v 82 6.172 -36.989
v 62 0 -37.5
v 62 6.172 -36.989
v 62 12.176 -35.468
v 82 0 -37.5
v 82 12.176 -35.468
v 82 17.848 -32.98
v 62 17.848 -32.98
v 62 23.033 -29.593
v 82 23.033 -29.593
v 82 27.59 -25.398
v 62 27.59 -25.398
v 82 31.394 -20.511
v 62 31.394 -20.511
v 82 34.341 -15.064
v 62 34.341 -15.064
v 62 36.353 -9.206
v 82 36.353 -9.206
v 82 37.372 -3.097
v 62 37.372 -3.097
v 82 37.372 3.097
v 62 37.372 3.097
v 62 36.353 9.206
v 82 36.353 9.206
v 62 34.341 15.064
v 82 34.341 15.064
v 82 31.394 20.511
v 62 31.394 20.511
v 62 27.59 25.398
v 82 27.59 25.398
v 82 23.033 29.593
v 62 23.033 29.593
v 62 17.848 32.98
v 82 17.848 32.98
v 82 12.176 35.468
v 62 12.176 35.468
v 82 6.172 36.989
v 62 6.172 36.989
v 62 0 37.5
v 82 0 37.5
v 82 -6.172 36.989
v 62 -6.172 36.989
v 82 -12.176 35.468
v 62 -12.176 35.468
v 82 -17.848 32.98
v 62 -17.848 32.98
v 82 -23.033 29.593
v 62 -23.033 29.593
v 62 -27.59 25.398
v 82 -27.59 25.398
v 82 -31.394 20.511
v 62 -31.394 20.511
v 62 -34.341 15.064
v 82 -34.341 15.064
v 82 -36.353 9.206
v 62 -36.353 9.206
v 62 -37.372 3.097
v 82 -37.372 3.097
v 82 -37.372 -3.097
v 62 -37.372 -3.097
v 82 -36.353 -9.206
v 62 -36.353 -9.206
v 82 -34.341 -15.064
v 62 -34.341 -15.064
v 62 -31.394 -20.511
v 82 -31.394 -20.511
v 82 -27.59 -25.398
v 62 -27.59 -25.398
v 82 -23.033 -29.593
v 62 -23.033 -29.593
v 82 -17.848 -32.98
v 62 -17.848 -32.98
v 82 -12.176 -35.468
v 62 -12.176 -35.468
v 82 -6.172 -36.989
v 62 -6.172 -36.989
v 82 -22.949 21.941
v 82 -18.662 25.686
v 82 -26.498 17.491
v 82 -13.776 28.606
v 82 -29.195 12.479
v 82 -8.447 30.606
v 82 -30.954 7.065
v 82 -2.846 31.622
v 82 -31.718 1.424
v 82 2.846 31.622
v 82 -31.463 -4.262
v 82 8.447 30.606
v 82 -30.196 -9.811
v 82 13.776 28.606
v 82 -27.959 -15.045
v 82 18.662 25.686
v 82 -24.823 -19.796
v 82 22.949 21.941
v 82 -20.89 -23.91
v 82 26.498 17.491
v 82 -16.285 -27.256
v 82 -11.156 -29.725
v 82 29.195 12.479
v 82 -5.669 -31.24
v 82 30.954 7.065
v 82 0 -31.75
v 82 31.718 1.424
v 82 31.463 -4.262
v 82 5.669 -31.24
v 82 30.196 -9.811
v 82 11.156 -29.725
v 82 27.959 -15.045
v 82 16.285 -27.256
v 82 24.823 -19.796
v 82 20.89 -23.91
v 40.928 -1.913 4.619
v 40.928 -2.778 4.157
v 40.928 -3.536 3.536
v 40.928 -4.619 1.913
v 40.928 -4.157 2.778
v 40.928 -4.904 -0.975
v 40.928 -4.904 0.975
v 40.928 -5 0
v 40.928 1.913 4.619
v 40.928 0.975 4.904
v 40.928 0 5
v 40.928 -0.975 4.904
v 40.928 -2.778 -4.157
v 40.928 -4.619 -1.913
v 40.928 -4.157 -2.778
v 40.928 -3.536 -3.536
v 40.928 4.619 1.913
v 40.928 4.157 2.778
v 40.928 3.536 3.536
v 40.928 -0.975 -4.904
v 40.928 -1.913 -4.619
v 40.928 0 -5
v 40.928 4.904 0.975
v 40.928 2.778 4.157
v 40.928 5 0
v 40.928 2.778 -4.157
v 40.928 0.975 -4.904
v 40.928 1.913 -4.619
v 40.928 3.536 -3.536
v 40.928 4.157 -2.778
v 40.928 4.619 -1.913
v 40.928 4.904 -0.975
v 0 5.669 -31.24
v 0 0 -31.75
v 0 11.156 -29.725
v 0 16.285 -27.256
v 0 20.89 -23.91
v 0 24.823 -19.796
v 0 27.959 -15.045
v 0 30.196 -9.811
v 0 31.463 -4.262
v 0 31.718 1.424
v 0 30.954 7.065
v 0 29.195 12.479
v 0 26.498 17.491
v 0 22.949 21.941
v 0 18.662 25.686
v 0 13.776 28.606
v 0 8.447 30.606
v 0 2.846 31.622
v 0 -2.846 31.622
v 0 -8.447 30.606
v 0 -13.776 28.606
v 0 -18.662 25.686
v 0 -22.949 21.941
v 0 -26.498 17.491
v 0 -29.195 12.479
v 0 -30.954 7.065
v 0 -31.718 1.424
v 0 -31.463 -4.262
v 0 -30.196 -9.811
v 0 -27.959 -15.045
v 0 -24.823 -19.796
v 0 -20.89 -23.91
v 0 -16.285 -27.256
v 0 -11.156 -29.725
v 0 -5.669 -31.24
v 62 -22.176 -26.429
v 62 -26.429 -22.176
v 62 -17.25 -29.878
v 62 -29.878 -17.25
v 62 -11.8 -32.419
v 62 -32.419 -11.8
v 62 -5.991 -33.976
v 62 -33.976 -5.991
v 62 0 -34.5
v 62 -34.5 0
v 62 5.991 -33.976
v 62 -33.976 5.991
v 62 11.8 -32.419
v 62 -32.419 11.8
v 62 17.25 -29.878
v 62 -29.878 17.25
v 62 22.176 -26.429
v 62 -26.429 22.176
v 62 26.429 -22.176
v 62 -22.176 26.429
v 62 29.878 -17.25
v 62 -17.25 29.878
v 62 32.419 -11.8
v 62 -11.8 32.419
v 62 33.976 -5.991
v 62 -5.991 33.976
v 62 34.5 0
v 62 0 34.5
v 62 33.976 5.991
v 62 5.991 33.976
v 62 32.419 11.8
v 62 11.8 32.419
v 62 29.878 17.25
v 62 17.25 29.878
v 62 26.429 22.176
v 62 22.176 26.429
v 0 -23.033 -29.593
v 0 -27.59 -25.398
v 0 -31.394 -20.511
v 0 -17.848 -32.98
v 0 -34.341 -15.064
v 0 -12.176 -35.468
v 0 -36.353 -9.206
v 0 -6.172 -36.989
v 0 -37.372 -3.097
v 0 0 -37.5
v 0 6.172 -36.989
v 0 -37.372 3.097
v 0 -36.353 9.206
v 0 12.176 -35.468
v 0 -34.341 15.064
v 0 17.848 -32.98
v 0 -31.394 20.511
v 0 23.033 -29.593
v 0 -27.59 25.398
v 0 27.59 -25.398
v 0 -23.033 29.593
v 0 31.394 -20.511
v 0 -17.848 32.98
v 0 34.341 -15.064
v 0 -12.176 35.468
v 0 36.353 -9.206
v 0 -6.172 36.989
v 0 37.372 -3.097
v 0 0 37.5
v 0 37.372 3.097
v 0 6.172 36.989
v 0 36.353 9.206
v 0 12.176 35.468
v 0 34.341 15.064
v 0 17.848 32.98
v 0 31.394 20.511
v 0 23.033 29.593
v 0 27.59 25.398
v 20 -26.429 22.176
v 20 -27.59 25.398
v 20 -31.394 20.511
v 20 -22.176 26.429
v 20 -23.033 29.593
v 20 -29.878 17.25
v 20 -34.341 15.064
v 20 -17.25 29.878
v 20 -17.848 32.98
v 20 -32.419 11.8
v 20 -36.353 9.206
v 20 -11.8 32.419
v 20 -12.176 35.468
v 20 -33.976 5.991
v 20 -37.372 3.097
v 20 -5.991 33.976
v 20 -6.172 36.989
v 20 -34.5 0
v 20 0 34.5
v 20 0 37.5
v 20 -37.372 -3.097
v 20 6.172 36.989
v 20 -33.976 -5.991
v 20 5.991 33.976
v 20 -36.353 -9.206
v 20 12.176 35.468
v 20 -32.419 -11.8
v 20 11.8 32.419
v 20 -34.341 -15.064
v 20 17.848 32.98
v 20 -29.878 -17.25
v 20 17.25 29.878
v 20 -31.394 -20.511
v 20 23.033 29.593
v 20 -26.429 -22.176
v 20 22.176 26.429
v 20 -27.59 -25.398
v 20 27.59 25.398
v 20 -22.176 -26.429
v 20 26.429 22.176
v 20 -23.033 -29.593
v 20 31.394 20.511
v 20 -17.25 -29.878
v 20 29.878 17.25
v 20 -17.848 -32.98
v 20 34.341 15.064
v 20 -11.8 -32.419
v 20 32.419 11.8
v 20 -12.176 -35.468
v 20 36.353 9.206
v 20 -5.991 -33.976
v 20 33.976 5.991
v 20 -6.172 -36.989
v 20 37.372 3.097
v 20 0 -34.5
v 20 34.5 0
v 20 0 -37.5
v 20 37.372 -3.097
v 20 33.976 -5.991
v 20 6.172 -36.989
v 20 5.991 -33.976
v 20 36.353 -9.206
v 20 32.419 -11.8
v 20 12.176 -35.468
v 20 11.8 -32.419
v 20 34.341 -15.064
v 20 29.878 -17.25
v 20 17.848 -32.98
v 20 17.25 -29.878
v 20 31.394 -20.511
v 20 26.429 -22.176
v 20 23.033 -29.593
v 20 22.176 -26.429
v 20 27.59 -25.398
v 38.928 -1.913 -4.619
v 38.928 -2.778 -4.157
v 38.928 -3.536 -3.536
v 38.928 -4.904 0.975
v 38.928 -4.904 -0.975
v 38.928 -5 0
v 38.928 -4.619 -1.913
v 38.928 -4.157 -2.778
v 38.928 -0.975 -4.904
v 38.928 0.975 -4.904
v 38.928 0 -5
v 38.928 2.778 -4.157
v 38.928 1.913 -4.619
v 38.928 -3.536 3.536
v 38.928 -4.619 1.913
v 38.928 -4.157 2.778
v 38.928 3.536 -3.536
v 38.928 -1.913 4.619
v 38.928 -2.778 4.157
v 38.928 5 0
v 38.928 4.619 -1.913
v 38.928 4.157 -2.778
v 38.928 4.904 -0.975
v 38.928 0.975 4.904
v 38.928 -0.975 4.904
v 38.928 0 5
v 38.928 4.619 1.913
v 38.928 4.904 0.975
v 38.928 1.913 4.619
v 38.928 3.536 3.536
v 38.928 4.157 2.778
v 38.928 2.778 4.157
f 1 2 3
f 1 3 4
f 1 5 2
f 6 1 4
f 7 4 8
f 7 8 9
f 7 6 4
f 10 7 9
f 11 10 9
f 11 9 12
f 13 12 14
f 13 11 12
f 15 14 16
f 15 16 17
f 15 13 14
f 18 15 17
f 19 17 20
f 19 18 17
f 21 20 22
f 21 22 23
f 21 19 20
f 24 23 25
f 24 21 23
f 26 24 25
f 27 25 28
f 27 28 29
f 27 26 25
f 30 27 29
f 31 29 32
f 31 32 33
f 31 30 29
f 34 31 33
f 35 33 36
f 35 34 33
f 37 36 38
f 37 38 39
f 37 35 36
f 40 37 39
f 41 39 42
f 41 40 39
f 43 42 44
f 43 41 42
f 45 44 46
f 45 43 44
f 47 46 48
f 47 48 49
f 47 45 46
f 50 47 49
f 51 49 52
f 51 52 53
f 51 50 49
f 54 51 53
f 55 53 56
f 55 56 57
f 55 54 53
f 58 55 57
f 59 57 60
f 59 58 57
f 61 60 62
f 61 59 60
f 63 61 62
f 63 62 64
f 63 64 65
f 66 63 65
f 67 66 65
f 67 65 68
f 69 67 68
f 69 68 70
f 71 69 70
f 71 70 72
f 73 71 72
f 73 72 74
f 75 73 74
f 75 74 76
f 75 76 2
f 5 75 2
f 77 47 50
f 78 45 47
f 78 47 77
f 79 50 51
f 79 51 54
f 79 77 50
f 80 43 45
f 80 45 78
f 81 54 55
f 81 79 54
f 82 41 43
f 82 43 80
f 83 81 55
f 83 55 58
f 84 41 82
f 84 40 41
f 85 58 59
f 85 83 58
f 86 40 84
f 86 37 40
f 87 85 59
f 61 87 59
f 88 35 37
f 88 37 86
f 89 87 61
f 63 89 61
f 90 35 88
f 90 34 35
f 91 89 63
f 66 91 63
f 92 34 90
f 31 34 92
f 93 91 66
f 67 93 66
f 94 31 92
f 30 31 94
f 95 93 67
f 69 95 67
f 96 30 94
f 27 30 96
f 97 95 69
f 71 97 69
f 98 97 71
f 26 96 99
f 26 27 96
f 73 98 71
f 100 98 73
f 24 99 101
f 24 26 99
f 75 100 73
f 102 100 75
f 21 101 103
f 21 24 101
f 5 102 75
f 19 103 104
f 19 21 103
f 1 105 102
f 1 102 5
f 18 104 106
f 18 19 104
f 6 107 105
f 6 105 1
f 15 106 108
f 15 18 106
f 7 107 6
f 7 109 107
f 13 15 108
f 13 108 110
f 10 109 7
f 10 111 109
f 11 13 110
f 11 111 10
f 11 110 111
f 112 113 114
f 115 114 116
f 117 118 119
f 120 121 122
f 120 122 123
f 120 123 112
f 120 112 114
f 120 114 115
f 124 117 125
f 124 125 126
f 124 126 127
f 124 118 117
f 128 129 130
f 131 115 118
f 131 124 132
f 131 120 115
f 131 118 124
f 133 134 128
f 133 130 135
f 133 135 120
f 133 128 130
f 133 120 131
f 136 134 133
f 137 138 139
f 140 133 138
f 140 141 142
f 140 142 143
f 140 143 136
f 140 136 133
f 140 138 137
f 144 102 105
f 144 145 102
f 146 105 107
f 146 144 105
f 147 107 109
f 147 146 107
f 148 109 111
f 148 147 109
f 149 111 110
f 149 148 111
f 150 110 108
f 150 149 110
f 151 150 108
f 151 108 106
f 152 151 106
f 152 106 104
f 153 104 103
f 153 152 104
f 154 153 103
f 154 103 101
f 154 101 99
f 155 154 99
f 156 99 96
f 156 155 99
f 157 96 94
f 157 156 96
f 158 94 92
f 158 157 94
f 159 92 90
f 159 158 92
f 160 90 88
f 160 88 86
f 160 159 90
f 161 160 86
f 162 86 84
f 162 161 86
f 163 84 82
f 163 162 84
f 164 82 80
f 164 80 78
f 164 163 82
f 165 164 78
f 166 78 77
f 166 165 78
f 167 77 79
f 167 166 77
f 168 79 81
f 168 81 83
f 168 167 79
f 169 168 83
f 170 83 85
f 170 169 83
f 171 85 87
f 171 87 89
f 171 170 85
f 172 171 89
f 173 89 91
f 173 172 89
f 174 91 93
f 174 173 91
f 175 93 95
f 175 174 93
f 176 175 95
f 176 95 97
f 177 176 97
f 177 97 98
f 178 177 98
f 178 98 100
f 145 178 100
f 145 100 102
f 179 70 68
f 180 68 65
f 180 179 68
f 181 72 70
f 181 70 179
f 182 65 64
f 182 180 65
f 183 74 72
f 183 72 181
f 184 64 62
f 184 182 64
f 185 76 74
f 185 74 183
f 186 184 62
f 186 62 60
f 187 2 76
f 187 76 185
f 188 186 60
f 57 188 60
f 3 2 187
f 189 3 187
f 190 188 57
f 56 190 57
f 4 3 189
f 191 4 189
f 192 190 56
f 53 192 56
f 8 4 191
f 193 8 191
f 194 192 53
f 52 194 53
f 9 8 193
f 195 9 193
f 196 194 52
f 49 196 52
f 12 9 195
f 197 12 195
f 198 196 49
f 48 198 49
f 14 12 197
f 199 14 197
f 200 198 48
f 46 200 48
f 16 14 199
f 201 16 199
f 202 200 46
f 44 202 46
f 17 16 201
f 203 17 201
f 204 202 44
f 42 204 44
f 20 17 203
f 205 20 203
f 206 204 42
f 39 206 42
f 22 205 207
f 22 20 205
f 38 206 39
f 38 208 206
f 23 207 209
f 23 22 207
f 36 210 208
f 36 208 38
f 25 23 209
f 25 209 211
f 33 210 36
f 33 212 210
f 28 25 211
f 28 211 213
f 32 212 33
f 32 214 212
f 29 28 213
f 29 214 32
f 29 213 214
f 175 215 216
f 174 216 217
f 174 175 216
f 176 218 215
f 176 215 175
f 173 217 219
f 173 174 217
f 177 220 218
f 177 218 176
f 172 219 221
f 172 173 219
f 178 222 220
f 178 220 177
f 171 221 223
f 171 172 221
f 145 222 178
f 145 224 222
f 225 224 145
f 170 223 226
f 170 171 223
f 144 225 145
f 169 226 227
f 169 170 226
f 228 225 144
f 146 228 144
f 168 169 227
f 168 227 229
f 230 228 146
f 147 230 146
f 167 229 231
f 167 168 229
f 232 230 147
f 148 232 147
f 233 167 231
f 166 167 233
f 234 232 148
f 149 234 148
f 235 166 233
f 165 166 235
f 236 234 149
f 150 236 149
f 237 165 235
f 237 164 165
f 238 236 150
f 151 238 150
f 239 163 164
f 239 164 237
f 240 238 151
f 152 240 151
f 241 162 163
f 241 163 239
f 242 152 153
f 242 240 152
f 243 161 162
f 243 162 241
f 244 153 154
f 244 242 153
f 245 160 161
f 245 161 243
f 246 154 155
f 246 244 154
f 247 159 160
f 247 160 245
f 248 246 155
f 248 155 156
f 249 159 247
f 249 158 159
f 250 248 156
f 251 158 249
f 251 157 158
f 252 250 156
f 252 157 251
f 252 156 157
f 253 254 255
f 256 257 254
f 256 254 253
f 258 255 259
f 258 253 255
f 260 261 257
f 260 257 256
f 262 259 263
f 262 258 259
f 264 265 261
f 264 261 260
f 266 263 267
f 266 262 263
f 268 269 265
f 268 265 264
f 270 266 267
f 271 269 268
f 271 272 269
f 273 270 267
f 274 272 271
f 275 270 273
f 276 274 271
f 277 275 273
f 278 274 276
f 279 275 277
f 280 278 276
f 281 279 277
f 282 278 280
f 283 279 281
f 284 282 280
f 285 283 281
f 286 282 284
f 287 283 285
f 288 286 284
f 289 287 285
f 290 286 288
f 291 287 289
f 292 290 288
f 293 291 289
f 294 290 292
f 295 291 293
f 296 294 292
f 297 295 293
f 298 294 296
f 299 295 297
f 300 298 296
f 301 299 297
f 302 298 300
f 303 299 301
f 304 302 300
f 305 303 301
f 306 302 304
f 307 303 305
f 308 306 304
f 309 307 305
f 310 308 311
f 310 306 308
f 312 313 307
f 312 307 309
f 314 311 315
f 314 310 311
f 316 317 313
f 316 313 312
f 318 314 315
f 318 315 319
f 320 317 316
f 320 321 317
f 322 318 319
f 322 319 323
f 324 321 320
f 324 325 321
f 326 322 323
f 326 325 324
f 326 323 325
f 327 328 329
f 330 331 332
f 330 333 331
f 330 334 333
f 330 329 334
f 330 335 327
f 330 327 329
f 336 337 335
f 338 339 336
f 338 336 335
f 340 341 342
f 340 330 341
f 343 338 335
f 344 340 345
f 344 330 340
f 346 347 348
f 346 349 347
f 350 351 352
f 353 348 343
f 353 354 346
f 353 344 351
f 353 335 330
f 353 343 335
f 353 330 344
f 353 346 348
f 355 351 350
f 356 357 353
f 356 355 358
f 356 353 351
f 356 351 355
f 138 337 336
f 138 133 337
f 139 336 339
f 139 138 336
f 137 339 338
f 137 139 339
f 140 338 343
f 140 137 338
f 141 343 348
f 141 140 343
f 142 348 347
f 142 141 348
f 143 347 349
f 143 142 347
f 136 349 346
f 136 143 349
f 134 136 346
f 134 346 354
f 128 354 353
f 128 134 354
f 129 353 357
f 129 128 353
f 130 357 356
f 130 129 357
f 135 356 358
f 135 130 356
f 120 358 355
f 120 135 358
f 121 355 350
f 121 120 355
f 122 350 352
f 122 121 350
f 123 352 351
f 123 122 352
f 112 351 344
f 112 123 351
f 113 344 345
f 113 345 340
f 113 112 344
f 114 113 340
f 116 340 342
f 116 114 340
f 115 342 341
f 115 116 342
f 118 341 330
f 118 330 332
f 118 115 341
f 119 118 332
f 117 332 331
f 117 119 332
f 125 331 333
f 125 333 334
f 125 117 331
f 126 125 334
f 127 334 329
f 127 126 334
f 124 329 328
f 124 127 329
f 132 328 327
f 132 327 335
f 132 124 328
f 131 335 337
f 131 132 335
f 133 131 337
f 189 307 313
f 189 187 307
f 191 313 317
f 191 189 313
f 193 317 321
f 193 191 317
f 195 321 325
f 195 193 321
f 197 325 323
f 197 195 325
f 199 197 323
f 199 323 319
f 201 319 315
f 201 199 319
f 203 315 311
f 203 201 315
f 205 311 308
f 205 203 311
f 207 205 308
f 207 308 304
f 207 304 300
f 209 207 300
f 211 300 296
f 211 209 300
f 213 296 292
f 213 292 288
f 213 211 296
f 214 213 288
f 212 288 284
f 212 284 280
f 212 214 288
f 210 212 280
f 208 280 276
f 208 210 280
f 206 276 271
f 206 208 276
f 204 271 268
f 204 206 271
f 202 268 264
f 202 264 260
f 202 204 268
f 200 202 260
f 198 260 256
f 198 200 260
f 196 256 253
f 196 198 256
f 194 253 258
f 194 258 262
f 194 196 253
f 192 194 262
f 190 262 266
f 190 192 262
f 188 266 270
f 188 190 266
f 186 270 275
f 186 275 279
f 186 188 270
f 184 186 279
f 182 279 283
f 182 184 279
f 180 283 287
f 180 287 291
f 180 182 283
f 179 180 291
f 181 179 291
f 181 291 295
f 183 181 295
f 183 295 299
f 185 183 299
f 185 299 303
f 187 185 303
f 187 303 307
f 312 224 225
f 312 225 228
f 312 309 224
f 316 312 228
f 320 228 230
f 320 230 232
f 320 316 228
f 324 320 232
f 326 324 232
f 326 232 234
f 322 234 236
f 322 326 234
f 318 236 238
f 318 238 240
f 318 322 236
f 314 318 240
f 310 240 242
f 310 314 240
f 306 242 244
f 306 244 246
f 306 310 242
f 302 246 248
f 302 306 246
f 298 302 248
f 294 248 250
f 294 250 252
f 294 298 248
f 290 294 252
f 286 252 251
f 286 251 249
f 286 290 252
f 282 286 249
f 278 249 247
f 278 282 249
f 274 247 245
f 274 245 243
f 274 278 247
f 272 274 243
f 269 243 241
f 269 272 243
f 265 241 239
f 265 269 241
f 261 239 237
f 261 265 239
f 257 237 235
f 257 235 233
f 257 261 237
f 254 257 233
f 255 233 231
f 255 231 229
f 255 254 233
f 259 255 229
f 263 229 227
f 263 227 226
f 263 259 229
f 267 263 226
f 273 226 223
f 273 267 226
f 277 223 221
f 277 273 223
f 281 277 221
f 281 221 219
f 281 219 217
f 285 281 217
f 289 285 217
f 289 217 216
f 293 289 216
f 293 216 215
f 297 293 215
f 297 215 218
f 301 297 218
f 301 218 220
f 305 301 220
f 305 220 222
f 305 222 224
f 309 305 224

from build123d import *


with BuildPart() as f2:
    # F1 (on Front) → F2 (revolve)
    with BuildSketch(Plane.XZ):
        Polygon((40.9283895493, 0), (39.9283895493, 0), (38.9283895493, 0), (38.9283895493, -5), (40.9283895493, -5), align=None)
    revolve(axis=Axis((41, 0, 0), (1, 0, 0)))


with BuildPart() as f2b:
    # F0 (on Front) → F2, piece 2 (revolve)
    with BuildSketch(Plane.XZ):
        Polygon((41, -31.75), (0, -31.75), (0, -37.5), (20, -37.5), (20, -34.5), (41, -34.5), align=None)
        Polygon((82, -31.75), (41, -31.75), (41, -34.5), (62, -34.5), (62, -37.5), (82, -37.5), align=None)
    revolve(axis=Axis((41, 0, 0), (1, 0, 0)))


solid = Compound([f2.part, f2b.part])
